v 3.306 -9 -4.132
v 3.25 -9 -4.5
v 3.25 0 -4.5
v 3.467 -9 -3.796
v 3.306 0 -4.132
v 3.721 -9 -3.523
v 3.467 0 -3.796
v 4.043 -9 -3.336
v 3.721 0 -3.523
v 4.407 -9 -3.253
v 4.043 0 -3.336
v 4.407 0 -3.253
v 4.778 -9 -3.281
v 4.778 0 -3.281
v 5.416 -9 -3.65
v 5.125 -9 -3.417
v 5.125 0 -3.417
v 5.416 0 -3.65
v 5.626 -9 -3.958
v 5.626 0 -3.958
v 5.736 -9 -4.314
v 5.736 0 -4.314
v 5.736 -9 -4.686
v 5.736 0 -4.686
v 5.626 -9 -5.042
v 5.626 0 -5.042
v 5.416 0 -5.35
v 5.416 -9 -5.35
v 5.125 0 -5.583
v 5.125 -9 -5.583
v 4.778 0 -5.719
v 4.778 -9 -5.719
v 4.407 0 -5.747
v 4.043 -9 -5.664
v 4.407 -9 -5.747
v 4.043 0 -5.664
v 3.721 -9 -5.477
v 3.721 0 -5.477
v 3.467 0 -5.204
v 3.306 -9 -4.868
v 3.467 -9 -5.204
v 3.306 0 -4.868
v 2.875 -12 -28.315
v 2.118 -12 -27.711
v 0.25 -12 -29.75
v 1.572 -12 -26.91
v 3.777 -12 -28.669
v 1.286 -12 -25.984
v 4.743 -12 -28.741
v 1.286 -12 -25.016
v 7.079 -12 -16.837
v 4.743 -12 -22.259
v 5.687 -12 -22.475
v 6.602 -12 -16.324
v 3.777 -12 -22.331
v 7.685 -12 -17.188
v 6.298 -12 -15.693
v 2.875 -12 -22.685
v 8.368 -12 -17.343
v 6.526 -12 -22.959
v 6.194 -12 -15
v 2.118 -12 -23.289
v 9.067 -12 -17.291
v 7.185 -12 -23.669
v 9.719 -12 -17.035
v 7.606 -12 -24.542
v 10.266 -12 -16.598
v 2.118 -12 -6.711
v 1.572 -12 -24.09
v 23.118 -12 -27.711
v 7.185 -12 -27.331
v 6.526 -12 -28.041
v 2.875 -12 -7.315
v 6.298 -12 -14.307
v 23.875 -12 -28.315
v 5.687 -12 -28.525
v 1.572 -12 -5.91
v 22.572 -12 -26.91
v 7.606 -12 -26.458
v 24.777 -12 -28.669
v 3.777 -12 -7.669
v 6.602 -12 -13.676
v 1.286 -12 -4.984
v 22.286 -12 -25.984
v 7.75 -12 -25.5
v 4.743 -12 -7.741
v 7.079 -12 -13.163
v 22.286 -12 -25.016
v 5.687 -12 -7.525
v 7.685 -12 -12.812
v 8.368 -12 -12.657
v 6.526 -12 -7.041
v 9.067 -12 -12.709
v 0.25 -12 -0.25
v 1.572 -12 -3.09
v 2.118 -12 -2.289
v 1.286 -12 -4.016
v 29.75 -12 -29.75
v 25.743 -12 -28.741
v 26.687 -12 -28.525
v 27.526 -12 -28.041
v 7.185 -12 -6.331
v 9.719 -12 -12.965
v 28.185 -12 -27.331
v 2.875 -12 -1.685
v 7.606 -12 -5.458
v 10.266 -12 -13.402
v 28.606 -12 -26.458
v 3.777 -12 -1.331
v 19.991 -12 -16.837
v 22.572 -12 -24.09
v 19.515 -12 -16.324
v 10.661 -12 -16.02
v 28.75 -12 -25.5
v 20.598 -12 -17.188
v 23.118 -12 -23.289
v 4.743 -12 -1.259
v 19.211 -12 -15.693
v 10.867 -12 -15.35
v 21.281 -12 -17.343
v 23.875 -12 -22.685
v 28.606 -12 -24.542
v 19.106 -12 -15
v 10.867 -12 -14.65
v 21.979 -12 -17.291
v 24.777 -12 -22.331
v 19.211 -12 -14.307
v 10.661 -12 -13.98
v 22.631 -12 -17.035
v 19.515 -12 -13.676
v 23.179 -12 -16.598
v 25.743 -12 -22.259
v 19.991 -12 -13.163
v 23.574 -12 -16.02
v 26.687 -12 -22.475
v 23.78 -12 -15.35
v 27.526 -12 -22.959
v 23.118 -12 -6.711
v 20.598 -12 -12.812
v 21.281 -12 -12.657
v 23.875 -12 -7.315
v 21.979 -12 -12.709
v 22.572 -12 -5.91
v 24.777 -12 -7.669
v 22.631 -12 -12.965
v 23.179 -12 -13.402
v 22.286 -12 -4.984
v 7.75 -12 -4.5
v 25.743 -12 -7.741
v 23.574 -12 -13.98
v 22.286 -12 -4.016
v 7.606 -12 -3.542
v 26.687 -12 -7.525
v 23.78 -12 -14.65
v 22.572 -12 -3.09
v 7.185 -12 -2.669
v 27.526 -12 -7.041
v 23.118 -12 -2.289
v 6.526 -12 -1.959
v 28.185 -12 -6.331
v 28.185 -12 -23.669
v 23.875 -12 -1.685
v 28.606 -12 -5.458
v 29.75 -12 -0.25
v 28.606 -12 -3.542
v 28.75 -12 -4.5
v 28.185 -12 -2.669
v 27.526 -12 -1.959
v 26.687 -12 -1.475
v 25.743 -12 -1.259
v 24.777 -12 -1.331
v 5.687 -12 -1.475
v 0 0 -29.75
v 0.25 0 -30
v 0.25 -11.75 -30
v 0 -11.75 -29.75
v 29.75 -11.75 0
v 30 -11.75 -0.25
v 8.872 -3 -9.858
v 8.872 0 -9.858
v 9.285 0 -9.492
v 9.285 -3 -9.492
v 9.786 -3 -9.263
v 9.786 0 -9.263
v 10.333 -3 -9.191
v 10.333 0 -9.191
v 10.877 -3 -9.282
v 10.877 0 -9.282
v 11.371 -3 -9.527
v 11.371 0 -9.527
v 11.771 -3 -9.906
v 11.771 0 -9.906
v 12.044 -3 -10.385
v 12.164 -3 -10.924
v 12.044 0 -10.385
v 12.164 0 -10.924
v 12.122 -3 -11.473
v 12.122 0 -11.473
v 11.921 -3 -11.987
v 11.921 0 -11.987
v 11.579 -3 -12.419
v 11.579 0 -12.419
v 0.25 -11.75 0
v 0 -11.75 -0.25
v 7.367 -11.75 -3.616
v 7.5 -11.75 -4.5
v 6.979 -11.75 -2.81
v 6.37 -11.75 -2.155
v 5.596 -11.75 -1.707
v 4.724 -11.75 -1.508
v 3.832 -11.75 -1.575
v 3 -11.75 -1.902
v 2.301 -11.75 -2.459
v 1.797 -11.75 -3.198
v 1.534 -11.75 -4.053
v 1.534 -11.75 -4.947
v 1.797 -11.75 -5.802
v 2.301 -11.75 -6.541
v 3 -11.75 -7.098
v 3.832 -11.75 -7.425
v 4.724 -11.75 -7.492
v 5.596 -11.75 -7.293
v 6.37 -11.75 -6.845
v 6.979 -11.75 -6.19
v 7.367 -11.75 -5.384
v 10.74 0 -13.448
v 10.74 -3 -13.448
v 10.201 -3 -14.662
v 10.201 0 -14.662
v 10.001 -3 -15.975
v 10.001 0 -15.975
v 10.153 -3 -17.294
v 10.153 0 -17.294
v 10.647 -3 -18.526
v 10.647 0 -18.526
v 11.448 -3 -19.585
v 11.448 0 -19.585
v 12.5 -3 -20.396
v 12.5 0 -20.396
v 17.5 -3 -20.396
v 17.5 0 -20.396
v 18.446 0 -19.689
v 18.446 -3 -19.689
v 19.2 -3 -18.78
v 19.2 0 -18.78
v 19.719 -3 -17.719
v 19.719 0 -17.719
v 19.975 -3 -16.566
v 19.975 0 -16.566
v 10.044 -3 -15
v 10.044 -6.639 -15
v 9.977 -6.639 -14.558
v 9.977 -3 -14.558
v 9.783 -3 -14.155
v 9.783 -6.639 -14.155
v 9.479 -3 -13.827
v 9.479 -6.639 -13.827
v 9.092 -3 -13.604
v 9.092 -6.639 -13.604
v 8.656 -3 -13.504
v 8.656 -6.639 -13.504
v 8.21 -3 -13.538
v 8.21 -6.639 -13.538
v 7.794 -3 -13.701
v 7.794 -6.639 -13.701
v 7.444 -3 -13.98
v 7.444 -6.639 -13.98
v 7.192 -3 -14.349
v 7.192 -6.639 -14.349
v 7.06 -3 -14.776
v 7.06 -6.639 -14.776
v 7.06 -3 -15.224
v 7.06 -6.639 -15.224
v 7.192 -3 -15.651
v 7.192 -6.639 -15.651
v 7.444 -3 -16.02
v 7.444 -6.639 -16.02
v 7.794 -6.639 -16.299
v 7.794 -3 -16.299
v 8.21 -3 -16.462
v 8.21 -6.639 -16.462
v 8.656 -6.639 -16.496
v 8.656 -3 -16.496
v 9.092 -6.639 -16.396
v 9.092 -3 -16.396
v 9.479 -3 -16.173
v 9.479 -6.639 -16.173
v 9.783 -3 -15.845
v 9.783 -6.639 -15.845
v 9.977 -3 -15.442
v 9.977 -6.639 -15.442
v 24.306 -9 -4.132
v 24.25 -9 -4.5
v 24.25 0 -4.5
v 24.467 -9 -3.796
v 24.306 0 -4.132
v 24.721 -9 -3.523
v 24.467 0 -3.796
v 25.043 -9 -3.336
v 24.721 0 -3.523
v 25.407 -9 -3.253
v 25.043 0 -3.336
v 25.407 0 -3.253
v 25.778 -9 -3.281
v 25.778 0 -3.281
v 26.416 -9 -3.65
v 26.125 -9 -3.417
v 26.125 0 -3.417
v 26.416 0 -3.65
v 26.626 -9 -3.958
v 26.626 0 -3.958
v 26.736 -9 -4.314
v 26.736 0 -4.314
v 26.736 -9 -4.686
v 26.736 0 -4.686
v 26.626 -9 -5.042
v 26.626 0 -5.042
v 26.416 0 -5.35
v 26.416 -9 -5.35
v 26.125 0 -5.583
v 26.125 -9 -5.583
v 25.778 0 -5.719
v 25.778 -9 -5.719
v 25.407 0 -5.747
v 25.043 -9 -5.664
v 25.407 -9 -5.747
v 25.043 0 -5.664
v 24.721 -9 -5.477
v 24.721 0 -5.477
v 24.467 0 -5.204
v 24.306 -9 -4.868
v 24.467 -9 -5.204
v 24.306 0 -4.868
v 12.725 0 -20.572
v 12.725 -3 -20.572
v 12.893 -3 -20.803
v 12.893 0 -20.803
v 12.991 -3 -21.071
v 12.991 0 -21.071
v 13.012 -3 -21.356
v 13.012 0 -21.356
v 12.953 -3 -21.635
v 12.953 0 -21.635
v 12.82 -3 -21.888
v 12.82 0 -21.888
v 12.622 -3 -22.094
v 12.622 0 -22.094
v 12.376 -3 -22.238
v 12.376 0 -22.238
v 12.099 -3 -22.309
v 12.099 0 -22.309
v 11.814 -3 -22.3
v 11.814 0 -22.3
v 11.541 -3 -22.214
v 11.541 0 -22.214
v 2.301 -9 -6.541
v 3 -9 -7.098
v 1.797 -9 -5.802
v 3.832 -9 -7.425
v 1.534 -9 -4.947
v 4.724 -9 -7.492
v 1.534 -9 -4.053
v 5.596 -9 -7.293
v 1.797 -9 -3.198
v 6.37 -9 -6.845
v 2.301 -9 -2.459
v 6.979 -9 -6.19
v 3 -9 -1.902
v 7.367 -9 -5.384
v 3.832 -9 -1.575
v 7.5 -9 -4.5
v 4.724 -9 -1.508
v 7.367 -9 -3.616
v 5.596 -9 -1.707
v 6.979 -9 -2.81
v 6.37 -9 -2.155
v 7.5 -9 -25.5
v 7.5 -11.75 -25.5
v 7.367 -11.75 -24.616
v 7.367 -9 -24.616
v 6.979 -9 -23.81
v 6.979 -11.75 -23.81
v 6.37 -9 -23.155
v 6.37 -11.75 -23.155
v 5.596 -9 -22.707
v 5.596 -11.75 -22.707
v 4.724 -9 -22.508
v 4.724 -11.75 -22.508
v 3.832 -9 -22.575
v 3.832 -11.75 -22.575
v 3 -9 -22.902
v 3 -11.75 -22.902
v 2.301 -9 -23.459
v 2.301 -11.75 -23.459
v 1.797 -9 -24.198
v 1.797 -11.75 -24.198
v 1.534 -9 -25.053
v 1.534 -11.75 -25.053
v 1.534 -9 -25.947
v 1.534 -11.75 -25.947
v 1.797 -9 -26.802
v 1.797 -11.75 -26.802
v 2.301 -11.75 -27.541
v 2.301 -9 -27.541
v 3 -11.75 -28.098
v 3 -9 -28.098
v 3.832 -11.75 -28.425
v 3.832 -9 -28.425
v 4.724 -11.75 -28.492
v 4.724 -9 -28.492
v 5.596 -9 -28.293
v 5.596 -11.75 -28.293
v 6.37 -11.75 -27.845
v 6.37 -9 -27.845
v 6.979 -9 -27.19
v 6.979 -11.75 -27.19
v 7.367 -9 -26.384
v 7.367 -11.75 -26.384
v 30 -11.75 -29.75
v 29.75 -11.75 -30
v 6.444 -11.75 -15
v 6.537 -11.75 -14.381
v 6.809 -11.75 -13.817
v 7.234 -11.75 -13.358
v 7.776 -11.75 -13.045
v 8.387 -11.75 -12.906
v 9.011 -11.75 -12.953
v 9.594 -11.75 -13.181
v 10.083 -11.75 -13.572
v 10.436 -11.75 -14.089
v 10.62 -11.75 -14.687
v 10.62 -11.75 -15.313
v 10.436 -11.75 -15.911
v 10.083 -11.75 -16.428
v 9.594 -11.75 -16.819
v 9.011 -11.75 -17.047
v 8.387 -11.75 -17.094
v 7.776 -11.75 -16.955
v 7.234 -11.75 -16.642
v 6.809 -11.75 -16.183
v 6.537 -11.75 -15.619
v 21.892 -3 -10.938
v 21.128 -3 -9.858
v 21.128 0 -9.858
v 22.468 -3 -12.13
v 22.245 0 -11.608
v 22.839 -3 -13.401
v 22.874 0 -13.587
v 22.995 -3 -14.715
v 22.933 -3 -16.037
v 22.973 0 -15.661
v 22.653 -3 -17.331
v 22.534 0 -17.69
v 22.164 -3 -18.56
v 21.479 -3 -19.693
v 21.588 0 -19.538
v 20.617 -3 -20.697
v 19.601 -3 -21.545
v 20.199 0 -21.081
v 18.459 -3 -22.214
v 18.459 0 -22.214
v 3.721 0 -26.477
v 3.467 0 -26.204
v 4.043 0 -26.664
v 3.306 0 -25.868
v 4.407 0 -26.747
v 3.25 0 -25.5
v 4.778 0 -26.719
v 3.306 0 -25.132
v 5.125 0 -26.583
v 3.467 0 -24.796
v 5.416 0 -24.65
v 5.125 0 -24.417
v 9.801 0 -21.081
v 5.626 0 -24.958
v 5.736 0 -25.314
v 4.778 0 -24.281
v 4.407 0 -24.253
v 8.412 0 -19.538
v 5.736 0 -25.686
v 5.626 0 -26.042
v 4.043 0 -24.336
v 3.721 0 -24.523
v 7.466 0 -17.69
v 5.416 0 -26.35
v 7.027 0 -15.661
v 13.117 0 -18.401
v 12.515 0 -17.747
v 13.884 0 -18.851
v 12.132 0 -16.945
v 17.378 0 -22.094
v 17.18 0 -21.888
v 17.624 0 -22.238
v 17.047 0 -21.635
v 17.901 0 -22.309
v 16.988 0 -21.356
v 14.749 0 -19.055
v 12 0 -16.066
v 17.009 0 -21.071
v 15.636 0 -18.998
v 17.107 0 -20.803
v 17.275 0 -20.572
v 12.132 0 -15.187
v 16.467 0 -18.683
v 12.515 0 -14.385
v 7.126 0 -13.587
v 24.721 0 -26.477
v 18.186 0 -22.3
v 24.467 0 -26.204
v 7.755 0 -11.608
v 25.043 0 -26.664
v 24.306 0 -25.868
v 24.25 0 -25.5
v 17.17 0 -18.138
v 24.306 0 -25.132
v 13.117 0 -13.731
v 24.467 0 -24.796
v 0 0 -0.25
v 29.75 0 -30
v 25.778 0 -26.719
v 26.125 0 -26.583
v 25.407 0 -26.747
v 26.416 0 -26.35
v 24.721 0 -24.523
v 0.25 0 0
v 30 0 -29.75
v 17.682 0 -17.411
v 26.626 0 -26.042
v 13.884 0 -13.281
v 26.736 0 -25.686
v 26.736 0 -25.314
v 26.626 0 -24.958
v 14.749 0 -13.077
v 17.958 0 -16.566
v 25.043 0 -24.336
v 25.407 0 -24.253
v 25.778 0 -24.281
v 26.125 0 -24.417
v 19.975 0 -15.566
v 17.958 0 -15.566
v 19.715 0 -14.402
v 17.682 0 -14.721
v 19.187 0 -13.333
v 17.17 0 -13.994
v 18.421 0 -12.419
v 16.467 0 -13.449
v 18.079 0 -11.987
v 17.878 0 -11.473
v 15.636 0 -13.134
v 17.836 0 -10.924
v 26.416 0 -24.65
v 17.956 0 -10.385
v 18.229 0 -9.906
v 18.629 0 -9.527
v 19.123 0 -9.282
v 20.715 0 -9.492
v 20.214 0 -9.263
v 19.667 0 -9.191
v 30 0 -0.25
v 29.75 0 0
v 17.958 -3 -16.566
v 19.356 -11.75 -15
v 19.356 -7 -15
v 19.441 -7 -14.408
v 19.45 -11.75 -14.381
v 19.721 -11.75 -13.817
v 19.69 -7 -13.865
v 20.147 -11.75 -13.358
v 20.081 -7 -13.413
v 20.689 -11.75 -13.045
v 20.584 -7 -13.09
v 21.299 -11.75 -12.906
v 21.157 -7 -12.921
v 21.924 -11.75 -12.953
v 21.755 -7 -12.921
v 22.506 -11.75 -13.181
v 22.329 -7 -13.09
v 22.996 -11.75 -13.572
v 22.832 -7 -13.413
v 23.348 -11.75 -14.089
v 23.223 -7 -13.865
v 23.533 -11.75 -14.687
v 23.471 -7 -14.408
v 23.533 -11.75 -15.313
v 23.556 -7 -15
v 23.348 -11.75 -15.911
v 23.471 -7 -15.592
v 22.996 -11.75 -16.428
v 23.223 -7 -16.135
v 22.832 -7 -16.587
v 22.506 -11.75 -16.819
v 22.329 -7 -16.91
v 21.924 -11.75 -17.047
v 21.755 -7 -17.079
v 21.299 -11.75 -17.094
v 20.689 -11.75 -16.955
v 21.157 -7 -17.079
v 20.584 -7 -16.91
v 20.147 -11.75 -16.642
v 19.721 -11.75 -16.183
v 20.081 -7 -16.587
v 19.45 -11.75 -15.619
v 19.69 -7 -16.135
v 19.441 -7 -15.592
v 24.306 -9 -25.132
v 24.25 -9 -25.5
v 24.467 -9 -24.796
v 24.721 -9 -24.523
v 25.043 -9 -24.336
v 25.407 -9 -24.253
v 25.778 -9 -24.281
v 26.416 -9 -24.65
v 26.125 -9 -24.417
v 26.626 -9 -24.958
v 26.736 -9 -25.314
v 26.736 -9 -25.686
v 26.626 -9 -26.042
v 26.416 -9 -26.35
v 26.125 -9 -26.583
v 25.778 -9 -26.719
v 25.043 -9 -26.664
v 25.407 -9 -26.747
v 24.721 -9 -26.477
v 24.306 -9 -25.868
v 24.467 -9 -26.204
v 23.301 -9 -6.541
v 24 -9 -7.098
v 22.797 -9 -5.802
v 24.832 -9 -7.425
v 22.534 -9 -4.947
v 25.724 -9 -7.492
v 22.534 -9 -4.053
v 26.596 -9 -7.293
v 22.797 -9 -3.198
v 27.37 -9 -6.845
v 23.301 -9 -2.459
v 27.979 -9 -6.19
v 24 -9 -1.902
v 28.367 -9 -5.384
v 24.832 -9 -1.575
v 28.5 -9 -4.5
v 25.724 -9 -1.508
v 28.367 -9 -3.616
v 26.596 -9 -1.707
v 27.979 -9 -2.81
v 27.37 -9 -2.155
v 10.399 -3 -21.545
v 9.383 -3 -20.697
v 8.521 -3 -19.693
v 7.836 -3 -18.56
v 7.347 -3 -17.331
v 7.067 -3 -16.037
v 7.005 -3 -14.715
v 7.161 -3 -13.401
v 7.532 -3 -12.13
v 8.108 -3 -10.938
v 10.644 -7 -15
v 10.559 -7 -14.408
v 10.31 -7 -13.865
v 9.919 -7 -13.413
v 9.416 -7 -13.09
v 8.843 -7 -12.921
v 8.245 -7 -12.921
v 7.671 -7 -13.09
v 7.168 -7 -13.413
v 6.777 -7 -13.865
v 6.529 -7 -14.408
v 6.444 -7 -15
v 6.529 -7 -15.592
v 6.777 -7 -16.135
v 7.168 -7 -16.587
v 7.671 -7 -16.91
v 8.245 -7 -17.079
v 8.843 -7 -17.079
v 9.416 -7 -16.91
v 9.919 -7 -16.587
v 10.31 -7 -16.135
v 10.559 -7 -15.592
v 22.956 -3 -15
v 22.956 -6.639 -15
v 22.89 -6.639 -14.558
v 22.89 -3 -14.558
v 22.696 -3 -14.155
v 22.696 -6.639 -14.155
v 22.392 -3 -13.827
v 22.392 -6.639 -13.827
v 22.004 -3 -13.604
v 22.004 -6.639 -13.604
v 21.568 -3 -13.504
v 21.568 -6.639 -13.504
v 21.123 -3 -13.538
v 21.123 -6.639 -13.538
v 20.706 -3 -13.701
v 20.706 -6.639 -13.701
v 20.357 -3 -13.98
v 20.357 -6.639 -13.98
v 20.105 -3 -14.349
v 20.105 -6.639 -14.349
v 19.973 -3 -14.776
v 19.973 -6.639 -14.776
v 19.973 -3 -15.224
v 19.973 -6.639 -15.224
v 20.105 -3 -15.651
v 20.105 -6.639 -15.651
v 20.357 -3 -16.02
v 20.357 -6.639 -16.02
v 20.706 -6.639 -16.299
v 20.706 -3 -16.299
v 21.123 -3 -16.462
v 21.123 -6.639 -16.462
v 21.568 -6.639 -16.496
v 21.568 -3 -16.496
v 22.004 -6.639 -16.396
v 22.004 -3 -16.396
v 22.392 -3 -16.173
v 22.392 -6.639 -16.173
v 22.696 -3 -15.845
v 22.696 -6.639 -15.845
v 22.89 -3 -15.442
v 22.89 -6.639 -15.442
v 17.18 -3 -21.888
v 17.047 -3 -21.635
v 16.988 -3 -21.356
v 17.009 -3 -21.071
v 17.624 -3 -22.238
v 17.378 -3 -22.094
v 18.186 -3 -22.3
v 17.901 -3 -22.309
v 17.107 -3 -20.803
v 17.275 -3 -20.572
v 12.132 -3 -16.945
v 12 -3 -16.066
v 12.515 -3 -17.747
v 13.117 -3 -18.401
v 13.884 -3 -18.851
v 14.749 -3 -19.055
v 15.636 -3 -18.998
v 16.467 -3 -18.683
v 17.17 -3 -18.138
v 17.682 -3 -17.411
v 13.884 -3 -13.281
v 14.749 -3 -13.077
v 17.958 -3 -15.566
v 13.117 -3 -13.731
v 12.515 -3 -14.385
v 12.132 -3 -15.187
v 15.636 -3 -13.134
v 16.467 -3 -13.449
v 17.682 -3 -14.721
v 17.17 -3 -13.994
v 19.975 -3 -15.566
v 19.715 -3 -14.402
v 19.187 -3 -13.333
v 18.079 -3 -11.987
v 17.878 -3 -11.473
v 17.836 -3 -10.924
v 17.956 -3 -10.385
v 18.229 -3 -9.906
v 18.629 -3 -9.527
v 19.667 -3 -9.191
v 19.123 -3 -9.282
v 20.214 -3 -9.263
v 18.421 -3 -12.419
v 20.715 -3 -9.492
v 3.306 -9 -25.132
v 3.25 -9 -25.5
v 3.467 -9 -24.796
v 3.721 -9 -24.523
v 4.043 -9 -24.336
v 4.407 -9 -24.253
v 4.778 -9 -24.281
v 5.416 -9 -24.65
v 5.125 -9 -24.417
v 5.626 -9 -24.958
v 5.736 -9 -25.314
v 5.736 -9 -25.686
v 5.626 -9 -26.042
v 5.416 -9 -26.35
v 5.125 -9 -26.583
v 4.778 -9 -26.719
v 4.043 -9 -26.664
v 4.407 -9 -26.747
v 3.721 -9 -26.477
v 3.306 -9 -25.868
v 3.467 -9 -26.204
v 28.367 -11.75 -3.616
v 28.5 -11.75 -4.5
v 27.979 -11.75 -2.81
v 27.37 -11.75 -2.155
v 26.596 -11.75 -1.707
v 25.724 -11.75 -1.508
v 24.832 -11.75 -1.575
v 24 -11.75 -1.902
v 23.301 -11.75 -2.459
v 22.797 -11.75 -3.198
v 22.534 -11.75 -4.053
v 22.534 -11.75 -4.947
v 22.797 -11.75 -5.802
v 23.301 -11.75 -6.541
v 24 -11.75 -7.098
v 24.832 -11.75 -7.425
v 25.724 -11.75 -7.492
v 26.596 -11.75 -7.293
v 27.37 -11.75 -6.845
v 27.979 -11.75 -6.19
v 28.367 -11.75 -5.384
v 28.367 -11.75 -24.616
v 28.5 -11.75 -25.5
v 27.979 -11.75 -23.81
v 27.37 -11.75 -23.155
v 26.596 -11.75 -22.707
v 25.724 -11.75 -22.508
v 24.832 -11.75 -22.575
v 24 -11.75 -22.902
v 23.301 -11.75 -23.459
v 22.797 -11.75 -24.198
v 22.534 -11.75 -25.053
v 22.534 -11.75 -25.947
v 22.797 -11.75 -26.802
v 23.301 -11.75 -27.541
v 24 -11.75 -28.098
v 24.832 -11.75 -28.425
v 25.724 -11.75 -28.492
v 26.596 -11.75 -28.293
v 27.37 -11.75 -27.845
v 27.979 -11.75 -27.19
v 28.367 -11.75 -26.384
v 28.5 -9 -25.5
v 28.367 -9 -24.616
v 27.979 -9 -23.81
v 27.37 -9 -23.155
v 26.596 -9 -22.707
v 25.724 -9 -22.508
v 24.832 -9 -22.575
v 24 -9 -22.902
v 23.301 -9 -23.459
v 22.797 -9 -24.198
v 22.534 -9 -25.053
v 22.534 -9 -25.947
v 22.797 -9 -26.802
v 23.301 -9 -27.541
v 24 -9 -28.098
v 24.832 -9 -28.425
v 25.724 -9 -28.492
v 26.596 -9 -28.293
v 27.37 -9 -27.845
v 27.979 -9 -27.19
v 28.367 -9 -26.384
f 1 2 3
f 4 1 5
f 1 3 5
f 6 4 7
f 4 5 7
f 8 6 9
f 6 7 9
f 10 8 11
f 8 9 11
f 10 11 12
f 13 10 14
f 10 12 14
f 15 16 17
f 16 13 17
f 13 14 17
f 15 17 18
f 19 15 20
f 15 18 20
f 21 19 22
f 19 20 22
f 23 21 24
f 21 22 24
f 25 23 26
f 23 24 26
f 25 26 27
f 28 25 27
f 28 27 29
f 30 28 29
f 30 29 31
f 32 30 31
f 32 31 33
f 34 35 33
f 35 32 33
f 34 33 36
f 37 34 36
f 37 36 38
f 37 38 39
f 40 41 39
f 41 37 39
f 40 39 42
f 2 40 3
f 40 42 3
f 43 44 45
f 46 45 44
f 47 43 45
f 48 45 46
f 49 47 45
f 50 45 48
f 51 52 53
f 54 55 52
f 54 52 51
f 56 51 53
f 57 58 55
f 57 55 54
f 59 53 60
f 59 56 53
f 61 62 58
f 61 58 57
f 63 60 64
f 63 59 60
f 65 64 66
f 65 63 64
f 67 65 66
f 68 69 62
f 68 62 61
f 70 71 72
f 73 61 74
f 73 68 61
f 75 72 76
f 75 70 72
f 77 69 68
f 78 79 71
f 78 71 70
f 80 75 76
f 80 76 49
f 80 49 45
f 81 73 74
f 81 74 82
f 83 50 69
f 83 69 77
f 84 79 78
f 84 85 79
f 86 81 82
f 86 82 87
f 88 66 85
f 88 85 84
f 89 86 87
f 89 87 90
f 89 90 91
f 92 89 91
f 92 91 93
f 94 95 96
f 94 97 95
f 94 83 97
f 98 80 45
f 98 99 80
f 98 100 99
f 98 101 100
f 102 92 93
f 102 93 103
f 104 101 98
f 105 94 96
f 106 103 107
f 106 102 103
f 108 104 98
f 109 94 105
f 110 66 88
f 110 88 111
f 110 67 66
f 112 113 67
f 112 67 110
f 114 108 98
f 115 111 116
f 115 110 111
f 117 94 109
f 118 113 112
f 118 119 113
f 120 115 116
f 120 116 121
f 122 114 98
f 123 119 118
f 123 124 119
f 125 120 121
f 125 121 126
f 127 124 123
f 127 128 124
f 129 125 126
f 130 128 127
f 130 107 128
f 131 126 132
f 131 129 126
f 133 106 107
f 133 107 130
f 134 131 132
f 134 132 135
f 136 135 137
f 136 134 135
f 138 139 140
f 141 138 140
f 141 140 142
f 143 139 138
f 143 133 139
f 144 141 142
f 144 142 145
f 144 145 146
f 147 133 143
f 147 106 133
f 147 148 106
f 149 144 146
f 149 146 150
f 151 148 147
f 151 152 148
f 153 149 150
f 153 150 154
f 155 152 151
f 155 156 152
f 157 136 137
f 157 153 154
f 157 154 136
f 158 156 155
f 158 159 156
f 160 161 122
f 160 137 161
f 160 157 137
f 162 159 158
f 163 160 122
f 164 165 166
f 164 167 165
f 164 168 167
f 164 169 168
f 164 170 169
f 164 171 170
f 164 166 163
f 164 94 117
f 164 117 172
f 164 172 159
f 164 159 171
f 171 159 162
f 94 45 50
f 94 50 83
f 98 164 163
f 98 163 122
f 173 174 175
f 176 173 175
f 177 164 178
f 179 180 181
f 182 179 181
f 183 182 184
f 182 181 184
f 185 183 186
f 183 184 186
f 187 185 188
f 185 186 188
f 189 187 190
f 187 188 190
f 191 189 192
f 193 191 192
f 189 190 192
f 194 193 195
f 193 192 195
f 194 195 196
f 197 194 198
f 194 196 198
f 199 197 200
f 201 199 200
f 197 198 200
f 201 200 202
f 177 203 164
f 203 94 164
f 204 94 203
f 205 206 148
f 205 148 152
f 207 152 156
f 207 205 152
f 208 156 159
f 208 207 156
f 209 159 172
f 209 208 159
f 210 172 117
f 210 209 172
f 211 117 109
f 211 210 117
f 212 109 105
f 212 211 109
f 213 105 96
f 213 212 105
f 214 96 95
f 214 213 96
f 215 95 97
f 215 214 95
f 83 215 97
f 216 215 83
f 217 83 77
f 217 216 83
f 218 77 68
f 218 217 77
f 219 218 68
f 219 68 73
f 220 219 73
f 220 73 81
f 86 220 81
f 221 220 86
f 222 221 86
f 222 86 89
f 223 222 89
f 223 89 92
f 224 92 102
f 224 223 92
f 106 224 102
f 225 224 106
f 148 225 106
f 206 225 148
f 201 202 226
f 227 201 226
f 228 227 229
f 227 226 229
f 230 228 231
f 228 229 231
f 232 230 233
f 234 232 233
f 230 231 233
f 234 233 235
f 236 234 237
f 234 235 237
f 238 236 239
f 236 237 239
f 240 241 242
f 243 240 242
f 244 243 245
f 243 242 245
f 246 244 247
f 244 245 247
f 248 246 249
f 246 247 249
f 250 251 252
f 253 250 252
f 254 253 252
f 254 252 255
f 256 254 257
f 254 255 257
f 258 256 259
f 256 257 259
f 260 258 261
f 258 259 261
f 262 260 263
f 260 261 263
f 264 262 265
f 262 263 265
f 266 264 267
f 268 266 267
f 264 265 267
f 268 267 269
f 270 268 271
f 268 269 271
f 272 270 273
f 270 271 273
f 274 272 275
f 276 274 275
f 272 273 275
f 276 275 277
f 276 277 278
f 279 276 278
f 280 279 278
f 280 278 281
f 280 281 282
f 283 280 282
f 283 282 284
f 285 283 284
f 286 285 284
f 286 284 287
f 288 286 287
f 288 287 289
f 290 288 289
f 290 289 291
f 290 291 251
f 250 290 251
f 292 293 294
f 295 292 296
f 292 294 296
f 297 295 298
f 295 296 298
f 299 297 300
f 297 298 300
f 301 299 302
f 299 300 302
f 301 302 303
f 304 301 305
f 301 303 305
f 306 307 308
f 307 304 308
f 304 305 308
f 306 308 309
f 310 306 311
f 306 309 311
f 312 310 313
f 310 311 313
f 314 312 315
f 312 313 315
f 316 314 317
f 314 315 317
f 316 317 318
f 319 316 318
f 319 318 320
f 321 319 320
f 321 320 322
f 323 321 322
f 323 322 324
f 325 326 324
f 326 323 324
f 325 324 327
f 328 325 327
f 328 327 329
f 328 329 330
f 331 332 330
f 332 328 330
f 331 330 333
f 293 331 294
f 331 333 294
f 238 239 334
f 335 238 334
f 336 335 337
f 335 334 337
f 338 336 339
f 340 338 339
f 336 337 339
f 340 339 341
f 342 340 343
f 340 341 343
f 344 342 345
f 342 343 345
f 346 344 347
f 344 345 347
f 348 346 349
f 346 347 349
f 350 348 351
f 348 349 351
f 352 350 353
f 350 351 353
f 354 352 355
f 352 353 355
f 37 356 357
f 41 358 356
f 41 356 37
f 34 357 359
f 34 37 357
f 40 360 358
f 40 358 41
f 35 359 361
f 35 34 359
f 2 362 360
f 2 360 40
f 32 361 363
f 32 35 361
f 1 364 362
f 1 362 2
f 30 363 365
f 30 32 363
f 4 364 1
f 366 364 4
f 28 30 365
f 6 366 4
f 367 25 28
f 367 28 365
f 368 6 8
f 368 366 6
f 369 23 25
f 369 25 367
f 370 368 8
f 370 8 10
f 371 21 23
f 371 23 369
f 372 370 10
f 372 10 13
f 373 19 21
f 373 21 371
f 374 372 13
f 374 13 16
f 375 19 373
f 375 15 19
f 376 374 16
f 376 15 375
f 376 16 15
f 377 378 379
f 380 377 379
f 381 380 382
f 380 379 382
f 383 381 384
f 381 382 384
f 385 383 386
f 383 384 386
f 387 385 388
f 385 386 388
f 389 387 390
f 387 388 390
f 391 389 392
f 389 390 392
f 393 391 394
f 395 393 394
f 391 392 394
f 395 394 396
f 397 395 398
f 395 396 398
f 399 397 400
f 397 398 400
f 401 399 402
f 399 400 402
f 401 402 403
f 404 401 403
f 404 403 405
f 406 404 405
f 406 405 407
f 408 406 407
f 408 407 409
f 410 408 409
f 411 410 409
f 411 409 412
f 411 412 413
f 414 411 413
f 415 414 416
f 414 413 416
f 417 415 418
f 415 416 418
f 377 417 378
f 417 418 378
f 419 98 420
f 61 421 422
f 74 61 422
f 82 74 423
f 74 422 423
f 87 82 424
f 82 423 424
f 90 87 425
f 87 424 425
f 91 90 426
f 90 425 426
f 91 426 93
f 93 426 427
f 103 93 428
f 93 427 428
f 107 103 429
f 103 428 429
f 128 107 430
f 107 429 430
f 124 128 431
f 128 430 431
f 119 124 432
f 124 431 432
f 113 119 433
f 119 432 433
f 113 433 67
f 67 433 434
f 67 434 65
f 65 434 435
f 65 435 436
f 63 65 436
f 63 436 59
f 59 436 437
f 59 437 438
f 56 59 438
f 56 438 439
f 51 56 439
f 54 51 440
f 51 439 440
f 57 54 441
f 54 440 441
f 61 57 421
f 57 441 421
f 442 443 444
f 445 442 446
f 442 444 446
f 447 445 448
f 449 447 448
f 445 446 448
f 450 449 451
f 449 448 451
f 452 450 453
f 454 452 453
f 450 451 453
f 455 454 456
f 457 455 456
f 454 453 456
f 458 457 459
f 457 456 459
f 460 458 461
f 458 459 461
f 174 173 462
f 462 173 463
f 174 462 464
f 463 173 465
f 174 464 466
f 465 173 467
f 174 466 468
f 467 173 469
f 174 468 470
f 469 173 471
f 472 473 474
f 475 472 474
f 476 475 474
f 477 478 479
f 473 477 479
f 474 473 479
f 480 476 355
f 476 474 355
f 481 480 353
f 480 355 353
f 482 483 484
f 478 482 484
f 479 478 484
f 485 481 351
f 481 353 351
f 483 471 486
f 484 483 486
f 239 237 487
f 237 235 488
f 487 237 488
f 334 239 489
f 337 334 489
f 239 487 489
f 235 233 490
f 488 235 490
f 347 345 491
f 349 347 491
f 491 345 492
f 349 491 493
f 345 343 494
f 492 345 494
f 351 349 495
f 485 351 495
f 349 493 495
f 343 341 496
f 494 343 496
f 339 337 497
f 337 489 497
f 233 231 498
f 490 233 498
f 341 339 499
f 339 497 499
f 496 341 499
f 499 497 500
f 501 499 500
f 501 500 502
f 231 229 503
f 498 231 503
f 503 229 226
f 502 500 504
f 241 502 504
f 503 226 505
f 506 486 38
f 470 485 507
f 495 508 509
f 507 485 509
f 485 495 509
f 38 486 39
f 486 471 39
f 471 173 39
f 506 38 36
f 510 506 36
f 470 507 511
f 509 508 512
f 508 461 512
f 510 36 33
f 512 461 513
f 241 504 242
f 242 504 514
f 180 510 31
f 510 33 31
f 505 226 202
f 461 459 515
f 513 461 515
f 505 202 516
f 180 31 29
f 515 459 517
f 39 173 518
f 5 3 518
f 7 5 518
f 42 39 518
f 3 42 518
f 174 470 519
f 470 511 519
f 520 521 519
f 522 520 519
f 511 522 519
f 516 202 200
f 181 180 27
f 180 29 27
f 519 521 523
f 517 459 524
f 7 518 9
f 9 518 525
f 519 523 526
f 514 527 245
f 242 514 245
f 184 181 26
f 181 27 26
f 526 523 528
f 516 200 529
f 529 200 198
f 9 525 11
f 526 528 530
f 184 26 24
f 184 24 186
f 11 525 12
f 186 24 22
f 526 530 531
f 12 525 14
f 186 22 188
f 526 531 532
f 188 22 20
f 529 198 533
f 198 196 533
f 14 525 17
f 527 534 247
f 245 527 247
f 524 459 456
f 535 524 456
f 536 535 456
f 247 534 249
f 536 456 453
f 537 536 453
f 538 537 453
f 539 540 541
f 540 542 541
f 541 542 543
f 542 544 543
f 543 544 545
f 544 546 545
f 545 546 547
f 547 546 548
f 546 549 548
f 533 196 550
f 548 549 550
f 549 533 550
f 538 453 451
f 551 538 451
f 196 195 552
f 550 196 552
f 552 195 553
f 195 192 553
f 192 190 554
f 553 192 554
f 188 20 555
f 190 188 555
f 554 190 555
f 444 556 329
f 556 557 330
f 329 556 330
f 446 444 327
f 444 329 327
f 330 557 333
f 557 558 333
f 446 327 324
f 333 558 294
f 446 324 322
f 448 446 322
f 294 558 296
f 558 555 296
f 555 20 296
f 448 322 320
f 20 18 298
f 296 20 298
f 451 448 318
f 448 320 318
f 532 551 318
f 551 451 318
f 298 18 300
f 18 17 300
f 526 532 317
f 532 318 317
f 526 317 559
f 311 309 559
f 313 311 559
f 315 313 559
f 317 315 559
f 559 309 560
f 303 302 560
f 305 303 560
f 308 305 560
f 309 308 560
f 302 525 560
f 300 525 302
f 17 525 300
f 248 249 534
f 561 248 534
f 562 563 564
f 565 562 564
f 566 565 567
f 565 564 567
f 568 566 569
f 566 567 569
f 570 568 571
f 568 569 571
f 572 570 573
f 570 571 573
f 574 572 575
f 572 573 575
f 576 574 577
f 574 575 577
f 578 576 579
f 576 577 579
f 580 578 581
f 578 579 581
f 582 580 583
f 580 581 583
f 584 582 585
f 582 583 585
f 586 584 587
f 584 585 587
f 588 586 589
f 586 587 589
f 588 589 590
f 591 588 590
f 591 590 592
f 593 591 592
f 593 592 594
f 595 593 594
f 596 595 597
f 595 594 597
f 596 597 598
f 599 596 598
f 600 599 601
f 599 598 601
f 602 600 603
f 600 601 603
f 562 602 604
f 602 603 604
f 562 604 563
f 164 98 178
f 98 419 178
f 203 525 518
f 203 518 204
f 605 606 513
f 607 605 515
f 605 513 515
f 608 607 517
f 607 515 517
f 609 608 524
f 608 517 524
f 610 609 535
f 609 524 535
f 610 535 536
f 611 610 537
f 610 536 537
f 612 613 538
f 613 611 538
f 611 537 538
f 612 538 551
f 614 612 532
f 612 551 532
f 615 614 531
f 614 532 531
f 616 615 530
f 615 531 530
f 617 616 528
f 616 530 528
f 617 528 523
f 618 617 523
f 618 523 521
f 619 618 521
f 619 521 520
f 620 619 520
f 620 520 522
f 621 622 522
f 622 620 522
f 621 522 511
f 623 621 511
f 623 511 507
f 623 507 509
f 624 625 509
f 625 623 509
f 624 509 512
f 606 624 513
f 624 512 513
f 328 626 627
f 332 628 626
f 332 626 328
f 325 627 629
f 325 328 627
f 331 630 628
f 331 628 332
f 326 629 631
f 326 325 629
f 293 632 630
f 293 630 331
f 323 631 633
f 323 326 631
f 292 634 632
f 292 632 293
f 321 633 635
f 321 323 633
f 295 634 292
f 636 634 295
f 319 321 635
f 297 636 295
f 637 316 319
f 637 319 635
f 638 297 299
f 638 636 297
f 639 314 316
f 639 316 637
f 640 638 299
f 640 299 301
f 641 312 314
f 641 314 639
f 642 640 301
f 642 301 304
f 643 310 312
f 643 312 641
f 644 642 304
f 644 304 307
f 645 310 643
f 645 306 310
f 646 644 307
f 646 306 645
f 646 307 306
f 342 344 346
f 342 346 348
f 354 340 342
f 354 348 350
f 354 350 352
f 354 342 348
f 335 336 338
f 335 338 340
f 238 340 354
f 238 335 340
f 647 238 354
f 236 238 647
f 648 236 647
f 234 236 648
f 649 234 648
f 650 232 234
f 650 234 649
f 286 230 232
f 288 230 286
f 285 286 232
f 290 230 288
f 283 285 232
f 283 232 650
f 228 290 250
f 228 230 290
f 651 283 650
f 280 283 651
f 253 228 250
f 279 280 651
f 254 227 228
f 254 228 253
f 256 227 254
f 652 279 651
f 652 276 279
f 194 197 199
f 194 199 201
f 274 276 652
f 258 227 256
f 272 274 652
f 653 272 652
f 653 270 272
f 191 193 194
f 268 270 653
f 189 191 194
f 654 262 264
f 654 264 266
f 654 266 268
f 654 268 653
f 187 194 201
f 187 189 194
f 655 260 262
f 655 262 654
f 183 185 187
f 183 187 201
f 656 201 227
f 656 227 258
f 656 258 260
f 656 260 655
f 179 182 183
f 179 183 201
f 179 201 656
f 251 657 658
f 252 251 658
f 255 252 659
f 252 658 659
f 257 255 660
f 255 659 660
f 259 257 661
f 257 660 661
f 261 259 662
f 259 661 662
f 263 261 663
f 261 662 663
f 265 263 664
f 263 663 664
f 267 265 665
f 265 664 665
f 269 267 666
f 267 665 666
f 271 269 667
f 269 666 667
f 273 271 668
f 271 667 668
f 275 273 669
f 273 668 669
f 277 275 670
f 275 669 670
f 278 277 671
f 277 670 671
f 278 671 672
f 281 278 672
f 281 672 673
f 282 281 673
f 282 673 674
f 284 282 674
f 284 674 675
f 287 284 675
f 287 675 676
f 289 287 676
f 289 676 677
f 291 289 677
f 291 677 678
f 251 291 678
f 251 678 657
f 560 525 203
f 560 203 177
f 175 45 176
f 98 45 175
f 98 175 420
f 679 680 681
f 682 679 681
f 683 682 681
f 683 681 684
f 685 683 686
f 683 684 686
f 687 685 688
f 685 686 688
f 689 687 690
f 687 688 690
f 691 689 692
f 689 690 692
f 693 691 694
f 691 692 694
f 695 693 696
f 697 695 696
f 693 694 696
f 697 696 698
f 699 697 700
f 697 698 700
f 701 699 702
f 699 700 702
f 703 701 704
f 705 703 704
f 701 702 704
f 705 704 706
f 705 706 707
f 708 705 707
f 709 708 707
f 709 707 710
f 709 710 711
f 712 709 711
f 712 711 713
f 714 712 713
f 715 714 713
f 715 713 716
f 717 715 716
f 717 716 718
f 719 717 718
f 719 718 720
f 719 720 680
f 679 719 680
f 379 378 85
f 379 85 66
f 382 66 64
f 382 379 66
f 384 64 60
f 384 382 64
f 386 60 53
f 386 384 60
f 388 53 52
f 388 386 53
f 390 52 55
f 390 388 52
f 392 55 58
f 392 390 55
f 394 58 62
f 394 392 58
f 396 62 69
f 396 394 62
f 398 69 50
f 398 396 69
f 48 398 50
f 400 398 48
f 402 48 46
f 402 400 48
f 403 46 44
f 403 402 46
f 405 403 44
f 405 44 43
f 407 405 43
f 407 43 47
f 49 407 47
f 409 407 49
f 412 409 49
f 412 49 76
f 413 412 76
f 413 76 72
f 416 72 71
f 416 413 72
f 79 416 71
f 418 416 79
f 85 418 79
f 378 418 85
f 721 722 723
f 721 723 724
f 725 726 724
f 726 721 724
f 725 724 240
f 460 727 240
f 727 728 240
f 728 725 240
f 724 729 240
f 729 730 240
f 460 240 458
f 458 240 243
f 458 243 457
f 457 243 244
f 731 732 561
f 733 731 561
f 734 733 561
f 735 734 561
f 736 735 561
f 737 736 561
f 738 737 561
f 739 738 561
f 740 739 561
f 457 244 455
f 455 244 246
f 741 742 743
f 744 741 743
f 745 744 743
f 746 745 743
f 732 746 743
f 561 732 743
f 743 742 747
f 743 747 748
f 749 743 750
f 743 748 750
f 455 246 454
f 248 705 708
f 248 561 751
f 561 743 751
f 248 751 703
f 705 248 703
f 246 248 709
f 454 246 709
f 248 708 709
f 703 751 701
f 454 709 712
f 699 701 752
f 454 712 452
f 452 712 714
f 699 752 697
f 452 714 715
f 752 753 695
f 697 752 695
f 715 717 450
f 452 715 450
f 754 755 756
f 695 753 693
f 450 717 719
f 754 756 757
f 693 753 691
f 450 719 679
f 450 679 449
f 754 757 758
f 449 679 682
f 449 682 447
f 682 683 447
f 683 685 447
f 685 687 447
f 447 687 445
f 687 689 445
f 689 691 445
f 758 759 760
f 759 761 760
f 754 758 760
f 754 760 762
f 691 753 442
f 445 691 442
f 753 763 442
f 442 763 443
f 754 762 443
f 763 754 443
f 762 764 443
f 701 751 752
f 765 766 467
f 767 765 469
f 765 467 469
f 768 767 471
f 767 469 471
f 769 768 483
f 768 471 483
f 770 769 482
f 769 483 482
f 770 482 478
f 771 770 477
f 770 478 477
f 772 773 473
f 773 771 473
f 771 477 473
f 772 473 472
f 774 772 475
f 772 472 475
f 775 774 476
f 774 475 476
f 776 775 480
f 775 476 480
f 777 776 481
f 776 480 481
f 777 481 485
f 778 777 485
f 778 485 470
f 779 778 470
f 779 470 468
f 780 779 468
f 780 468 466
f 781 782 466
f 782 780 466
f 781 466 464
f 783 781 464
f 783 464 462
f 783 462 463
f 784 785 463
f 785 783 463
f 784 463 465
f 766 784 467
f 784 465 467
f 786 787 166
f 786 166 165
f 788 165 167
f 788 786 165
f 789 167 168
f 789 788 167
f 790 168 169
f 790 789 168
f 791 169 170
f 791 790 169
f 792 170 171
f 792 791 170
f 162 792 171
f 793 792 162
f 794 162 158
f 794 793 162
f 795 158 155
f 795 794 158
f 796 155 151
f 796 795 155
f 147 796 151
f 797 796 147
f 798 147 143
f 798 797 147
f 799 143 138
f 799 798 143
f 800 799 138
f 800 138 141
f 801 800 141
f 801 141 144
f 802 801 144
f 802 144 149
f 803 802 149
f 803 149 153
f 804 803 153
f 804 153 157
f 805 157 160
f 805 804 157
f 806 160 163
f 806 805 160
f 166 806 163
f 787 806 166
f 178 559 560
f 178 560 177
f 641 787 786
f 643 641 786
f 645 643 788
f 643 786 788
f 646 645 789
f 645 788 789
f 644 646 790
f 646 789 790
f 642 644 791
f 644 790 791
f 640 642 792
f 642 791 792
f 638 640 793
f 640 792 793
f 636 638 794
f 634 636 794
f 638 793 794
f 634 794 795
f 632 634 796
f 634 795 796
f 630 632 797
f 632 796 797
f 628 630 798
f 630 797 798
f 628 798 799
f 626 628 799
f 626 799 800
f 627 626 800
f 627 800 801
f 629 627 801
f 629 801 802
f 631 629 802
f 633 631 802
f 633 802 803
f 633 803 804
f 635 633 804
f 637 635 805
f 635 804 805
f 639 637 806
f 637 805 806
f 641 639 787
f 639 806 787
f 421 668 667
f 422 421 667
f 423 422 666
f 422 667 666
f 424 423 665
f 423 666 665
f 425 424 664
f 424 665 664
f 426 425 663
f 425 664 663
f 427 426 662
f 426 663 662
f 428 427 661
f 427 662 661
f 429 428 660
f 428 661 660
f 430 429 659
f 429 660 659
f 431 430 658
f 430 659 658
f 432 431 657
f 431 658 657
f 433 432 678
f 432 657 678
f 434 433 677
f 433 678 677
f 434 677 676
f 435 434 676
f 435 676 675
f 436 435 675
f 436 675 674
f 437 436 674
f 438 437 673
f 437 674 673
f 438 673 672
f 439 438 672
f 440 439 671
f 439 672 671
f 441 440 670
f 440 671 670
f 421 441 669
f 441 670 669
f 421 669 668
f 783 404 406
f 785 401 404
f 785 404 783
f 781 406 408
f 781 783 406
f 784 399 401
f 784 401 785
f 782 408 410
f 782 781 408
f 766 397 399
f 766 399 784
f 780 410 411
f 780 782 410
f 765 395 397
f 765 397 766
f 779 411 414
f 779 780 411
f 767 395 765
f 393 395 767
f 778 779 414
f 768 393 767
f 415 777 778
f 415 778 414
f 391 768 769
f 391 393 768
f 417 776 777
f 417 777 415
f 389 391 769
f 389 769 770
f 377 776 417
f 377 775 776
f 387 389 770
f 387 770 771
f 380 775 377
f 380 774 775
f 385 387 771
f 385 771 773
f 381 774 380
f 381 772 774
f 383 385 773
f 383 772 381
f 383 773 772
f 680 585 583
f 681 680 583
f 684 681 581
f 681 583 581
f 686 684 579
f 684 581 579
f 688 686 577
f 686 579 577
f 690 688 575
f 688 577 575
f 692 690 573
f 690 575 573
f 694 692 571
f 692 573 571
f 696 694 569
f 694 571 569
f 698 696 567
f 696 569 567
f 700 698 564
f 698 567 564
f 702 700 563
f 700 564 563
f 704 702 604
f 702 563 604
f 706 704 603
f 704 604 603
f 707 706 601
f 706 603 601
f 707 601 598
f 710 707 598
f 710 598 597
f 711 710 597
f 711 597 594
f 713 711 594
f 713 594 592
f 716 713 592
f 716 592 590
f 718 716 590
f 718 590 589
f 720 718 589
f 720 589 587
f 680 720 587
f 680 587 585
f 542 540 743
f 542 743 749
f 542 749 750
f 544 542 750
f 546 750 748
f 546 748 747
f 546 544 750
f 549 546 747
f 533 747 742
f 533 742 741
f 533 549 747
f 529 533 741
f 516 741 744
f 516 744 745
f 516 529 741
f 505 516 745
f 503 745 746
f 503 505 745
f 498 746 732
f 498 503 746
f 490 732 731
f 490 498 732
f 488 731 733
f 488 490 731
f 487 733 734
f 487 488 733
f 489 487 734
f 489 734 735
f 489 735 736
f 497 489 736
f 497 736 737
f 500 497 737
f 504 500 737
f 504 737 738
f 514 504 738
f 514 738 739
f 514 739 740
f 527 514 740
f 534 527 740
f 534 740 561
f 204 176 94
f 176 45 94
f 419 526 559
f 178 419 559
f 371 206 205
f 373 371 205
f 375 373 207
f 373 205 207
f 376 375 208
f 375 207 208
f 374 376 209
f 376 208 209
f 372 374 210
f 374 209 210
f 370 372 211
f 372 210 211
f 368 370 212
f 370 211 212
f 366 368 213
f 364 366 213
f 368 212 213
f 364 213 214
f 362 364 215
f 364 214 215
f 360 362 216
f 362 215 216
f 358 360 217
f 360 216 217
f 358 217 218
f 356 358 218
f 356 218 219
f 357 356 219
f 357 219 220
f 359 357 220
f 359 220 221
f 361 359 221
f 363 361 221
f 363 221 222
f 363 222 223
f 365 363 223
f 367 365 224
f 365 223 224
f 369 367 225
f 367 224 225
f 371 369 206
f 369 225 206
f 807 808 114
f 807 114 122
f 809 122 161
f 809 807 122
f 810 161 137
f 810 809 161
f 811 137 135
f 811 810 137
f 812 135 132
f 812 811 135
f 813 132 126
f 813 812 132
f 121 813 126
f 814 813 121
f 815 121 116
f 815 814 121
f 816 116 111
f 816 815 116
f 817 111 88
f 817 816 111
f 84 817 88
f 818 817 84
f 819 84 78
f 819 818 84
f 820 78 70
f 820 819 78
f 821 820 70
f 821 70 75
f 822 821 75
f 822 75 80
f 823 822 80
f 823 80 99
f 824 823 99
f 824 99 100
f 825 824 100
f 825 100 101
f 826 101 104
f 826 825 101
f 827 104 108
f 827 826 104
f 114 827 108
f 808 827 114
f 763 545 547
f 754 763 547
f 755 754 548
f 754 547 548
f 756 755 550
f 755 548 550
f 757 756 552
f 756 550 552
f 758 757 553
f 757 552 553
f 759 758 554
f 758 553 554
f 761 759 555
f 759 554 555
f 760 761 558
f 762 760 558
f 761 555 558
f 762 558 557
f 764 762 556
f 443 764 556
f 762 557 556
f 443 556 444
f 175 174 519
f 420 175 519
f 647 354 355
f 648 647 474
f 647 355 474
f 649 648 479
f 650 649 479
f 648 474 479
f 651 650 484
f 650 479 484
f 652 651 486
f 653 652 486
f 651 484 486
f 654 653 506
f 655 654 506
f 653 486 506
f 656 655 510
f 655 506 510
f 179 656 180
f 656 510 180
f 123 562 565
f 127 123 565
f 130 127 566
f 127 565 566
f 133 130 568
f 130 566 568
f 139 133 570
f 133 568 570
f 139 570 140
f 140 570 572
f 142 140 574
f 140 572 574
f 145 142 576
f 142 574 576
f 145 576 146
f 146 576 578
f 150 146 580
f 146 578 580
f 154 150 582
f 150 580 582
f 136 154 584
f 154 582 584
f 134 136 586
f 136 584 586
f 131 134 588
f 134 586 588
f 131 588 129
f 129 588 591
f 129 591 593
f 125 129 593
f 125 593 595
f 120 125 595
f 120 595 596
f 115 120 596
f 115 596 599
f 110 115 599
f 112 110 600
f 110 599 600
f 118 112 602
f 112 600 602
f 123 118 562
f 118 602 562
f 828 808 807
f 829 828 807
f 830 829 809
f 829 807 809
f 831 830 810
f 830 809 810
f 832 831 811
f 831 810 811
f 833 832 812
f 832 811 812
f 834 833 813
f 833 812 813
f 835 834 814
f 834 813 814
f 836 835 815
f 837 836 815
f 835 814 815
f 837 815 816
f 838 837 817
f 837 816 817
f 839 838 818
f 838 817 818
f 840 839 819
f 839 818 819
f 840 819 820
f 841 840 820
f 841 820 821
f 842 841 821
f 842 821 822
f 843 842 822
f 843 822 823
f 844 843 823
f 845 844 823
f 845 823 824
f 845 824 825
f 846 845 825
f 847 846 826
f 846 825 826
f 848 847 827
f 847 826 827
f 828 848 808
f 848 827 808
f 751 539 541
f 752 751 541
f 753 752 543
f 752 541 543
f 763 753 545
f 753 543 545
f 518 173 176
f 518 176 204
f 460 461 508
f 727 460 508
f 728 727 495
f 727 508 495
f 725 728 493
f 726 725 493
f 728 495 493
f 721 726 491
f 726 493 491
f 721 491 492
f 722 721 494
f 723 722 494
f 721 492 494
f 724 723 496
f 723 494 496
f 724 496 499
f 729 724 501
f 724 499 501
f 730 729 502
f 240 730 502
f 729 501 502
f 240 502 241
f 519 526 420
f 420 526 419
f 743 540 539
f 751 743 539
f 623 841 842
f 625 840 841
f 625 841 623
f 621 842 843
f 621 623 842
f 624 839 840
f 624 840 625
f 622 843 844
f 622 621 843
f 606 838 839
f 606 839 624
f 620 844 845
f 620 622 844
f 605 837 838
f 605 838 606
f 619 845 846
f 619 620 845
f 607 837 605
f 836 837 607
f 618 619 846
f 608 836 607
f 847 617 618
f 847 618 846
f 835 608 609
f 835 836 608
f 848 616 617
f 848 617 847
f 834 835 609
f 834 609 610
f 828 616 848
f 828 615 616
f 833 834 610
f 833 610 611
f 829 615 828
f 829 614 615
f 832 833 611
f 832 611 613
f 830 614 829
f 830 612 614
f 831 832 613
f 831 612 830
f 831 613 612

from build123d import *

# Parameters (mm, degrees)
F0_W      = 30
F0_H      = 30
F0_R      = 10
F0_R_2    = 3
F1_DEPTH  = 12
F2_R      = 1.25
F3_DEPTH  = 20
F4_DEPTH  = 3
F5_R      = 3
F5_R_2    = 1.25
F6_DEPTH  = 3
F8_DEPTH  = 3
F9_DEPTH  = 3
F12_D     = 3
F14_D     = 4.2
F14_DEPTH = 5
F14_TIP   = 1.2618073
F15_SIZE  = 0.25


# Not quite as in the source:
# - a feature names something its author has since deleted; it is built from what else it names


with BuildPart() as f1:
    # F0 (on Front) → F1 (new body)
    with BuildSketch(Plane.XZ):
        with Locations((15, -15)):
            Rectangle(F0_W, F0_H)
        with Locations((15, -15)):
            Circle(F0_R, mode=Mode.SUBTRACT)
        with Locations((15, -15)):
            Circle(F0_R)
        with Locations((15, -16.066)):
            Circle(F0_R_2, mode=Mode.SUBTRACT)
        with Locations((15, -16.066)):
            Circle(F0_R_2)
    extrude(amount=F1_DEPTH)

    # F2 (on face) → F3 (cut)
    with BuildSketch(Plane(origin=(0, 0, 0), x_dir=(-1, 0, 0), z_dir=(0, 1, 0))):
        with Locations((-4.5, -4.5)):
            Circle(F2_R)
        with Locations((-25.5, -4.5)):
            Circle(F2_R)
        with Locations((-25.5, -25.5)):
            Circle(F2_R)
        with Locations((-4.5, -25.5)):
            Circle(F2_R)
    extrude(amount=-F3_DEPTH, mode=Mode.SUBTRACT)

    # F0 (on Front) → F4 (cut)
    with BuildSketch(Plane.XZ):
        with Locations((15, -16.066)):
            Circle(F0_R_2)
    extrude(amount=F4_DEPTH, mode=Mode.SUBTRACT)

    # F5 (on face) → F6 (cut)
    with BuildSketch(Plane.XZ.offset(12)):
        with Locations((4.5, -4.5)):
            Circle(F5_R)
        with Locations((4.5, -4.5)):
            Circle(F5_R_2, mode=Mode.SUBTRACT)
        with Locations((25.5, -4.5)):
            Circle(F5_R)
        with Locations((25.5, -4.5)):
            Circle(F5_R_2, mode=Mode.SUBTRACT)
        with Locations((4.5, -25.5)):
            Circle(F5_R)
        with Locations((4.5, -25.5)):
            Circle(F5_R_2, mode=Mode.SUBTRACT)
        with Locations((25.5, -25.5)):
            Circle(F5_R)
        with Locations((25.5, -25.5)):
            Circle(F5_R_2, mode=Mode.SUBTRACT)
    extrude(amount=-F6_DEPTH, mode=Mode.SUBTRACT)

    # F7 (on face) → F8 (cut)
    with BuildSketch(Plane(origin=(0, 0, 0), x_dir=(-1, 0, 0), z_dir=(0, 1, 0))):
        with BuildLine():
            Line((-17.9580398915, -15.566), (-19.9749371855, -15.566))
            ThreePointArc((-19.9749371855, -15.566), (-20, -16.066), (-19.9749371855, -16.566))
            Line((-19.9749371855, -16.566), (-17.9580398915, -16.566))
            ThreePointArc((-17.9580398915, -16.566), (-18, -16.066), (-17.9580398915, -15.566))
        make_face()
    extrude(amount=-F8_DEPTH, mode=Mode.SUBTRACT)

    # F7 (on face) → F9 (cut)
    with BuildSketch(Plane(origin=(0, 0, 0), x_dir=(-1, 0, 0), z_dir=(0, 1, 0))):
        with BuildLine():
            ThreePointArc((-18.4208497185, -12.4193868859), (-18.4150519192, -9.7016030586), (-21.128355545, -9.8576991225))
            ThreePointArc((-21.128355545, -9.8576991225), (-22.8195543866, -16.6895470386), (-18.4586259046, -22.2137304394))
            ThreePointArc((-18.4586259046, -22.2137304394), (-17.1046358453, -21.7662439553), (-17.5, -20.3961270189))
            ThreePointArc((-17.5, -20.3961270189), (-19.1995404186, -18.7796433577), (-19.9749371855, -16.566))
            Line((-19.9749371855, -16.566), (-21.5030275285, -16.566))
            ThreePointArc((-21.5030275285, -16.566), (-22.0030275285, -16.066), (-21.5030275285, -15.566))
            Line((-21.5030275285, -15.566), (-19.9749371855, -15.566))
            ThreePointArc((-19.9749371855, -15.566), (-19.4830350162, -13.8518642672), (-18.4208497185, -12.4193868859))
        make_face()
        with BuildLine():
            ThreePointArc((-11.5413740954, -22.2137304394), (-7.1804456134, -16.6895470386), (-8.871644455, -9.8576991225))
            ThreePointArc((-8.871644455, -9.8576991225), (-11.5849480808, -9.7016030586), (-11.5791502815, -12.4193868859))
            ThreePointArc((-11.5791502815, -12.4193868859), (-10.0329877054, -16.6394011384), (-12.5, -20.3961270189))
            ThreePointArc((-12.5, -20.3961270189), (-12.8953641547, -21.7662439553), (-11.5413740954, -22.2137304394))
        make_face()
        with BuildLine():
            ThreePointArc((-19.9749371855, -16.566), (-20, -16.066), (-19.9749371855, -15.566))
            Line((-19.9749371855, -15.566), (-21.5030275285, -15.566))
            ThreePointArc((-21.5030275285, -15.566), (-22.0030275285, -16.066), (-21.5030275285, -16.566))
            Line((-21.5030275285, -16.566), (-19.9749371855, -16.566))
        make_face()
    extrude(amount=-F9_DEPTH, mode=Mode.SUBTRACT)

    # F12 (through all)
    with Locations(Plane(origin=(0, 0, 0), x_dir=(-1, 0, 0), z_dir=(0, 1, 0))):
        with Locations((-21.456294, -15), (-8.543706, -15)):
            Hole(F12_D / 2)

    # F14
    with Locations(Plane.XZ.offset(12)):
        with Locations((8.543706, -15), (21.456294, -15)):
            Hole(F14_D / 2, depth=F14_DEPTH)
            with Locations((0, 0, -(F14_DEPTH + F14_TIP / 2))):  # 118° drill point
                Cone(0, F14_D / 2, F14_TIP, mode=Mode.SUBTRACT)

    # F15
    f15_edges = [f1.edges().sort_by_distance(p)[0] for p in [
        (15, -12, 0),
        (30, -12, -15),
        (0, -12, -15),
        (15, -12, -30),
        (1.5, -12, -25.5),
        (22.5, -12, -25.5),
        (6.443706, -12, -15),
        (1.5, -12, -4.5),
        (19.356294, -12, -15),
        (22.5, -12, -4.5),
        (0, -6, 0),
        (30, -6, 0),
        (30, -6, -30),
        (0, -6, -30),
    ]]
    chamfer(f15_edges, length=F15_SIZE)


solid = f1.part
